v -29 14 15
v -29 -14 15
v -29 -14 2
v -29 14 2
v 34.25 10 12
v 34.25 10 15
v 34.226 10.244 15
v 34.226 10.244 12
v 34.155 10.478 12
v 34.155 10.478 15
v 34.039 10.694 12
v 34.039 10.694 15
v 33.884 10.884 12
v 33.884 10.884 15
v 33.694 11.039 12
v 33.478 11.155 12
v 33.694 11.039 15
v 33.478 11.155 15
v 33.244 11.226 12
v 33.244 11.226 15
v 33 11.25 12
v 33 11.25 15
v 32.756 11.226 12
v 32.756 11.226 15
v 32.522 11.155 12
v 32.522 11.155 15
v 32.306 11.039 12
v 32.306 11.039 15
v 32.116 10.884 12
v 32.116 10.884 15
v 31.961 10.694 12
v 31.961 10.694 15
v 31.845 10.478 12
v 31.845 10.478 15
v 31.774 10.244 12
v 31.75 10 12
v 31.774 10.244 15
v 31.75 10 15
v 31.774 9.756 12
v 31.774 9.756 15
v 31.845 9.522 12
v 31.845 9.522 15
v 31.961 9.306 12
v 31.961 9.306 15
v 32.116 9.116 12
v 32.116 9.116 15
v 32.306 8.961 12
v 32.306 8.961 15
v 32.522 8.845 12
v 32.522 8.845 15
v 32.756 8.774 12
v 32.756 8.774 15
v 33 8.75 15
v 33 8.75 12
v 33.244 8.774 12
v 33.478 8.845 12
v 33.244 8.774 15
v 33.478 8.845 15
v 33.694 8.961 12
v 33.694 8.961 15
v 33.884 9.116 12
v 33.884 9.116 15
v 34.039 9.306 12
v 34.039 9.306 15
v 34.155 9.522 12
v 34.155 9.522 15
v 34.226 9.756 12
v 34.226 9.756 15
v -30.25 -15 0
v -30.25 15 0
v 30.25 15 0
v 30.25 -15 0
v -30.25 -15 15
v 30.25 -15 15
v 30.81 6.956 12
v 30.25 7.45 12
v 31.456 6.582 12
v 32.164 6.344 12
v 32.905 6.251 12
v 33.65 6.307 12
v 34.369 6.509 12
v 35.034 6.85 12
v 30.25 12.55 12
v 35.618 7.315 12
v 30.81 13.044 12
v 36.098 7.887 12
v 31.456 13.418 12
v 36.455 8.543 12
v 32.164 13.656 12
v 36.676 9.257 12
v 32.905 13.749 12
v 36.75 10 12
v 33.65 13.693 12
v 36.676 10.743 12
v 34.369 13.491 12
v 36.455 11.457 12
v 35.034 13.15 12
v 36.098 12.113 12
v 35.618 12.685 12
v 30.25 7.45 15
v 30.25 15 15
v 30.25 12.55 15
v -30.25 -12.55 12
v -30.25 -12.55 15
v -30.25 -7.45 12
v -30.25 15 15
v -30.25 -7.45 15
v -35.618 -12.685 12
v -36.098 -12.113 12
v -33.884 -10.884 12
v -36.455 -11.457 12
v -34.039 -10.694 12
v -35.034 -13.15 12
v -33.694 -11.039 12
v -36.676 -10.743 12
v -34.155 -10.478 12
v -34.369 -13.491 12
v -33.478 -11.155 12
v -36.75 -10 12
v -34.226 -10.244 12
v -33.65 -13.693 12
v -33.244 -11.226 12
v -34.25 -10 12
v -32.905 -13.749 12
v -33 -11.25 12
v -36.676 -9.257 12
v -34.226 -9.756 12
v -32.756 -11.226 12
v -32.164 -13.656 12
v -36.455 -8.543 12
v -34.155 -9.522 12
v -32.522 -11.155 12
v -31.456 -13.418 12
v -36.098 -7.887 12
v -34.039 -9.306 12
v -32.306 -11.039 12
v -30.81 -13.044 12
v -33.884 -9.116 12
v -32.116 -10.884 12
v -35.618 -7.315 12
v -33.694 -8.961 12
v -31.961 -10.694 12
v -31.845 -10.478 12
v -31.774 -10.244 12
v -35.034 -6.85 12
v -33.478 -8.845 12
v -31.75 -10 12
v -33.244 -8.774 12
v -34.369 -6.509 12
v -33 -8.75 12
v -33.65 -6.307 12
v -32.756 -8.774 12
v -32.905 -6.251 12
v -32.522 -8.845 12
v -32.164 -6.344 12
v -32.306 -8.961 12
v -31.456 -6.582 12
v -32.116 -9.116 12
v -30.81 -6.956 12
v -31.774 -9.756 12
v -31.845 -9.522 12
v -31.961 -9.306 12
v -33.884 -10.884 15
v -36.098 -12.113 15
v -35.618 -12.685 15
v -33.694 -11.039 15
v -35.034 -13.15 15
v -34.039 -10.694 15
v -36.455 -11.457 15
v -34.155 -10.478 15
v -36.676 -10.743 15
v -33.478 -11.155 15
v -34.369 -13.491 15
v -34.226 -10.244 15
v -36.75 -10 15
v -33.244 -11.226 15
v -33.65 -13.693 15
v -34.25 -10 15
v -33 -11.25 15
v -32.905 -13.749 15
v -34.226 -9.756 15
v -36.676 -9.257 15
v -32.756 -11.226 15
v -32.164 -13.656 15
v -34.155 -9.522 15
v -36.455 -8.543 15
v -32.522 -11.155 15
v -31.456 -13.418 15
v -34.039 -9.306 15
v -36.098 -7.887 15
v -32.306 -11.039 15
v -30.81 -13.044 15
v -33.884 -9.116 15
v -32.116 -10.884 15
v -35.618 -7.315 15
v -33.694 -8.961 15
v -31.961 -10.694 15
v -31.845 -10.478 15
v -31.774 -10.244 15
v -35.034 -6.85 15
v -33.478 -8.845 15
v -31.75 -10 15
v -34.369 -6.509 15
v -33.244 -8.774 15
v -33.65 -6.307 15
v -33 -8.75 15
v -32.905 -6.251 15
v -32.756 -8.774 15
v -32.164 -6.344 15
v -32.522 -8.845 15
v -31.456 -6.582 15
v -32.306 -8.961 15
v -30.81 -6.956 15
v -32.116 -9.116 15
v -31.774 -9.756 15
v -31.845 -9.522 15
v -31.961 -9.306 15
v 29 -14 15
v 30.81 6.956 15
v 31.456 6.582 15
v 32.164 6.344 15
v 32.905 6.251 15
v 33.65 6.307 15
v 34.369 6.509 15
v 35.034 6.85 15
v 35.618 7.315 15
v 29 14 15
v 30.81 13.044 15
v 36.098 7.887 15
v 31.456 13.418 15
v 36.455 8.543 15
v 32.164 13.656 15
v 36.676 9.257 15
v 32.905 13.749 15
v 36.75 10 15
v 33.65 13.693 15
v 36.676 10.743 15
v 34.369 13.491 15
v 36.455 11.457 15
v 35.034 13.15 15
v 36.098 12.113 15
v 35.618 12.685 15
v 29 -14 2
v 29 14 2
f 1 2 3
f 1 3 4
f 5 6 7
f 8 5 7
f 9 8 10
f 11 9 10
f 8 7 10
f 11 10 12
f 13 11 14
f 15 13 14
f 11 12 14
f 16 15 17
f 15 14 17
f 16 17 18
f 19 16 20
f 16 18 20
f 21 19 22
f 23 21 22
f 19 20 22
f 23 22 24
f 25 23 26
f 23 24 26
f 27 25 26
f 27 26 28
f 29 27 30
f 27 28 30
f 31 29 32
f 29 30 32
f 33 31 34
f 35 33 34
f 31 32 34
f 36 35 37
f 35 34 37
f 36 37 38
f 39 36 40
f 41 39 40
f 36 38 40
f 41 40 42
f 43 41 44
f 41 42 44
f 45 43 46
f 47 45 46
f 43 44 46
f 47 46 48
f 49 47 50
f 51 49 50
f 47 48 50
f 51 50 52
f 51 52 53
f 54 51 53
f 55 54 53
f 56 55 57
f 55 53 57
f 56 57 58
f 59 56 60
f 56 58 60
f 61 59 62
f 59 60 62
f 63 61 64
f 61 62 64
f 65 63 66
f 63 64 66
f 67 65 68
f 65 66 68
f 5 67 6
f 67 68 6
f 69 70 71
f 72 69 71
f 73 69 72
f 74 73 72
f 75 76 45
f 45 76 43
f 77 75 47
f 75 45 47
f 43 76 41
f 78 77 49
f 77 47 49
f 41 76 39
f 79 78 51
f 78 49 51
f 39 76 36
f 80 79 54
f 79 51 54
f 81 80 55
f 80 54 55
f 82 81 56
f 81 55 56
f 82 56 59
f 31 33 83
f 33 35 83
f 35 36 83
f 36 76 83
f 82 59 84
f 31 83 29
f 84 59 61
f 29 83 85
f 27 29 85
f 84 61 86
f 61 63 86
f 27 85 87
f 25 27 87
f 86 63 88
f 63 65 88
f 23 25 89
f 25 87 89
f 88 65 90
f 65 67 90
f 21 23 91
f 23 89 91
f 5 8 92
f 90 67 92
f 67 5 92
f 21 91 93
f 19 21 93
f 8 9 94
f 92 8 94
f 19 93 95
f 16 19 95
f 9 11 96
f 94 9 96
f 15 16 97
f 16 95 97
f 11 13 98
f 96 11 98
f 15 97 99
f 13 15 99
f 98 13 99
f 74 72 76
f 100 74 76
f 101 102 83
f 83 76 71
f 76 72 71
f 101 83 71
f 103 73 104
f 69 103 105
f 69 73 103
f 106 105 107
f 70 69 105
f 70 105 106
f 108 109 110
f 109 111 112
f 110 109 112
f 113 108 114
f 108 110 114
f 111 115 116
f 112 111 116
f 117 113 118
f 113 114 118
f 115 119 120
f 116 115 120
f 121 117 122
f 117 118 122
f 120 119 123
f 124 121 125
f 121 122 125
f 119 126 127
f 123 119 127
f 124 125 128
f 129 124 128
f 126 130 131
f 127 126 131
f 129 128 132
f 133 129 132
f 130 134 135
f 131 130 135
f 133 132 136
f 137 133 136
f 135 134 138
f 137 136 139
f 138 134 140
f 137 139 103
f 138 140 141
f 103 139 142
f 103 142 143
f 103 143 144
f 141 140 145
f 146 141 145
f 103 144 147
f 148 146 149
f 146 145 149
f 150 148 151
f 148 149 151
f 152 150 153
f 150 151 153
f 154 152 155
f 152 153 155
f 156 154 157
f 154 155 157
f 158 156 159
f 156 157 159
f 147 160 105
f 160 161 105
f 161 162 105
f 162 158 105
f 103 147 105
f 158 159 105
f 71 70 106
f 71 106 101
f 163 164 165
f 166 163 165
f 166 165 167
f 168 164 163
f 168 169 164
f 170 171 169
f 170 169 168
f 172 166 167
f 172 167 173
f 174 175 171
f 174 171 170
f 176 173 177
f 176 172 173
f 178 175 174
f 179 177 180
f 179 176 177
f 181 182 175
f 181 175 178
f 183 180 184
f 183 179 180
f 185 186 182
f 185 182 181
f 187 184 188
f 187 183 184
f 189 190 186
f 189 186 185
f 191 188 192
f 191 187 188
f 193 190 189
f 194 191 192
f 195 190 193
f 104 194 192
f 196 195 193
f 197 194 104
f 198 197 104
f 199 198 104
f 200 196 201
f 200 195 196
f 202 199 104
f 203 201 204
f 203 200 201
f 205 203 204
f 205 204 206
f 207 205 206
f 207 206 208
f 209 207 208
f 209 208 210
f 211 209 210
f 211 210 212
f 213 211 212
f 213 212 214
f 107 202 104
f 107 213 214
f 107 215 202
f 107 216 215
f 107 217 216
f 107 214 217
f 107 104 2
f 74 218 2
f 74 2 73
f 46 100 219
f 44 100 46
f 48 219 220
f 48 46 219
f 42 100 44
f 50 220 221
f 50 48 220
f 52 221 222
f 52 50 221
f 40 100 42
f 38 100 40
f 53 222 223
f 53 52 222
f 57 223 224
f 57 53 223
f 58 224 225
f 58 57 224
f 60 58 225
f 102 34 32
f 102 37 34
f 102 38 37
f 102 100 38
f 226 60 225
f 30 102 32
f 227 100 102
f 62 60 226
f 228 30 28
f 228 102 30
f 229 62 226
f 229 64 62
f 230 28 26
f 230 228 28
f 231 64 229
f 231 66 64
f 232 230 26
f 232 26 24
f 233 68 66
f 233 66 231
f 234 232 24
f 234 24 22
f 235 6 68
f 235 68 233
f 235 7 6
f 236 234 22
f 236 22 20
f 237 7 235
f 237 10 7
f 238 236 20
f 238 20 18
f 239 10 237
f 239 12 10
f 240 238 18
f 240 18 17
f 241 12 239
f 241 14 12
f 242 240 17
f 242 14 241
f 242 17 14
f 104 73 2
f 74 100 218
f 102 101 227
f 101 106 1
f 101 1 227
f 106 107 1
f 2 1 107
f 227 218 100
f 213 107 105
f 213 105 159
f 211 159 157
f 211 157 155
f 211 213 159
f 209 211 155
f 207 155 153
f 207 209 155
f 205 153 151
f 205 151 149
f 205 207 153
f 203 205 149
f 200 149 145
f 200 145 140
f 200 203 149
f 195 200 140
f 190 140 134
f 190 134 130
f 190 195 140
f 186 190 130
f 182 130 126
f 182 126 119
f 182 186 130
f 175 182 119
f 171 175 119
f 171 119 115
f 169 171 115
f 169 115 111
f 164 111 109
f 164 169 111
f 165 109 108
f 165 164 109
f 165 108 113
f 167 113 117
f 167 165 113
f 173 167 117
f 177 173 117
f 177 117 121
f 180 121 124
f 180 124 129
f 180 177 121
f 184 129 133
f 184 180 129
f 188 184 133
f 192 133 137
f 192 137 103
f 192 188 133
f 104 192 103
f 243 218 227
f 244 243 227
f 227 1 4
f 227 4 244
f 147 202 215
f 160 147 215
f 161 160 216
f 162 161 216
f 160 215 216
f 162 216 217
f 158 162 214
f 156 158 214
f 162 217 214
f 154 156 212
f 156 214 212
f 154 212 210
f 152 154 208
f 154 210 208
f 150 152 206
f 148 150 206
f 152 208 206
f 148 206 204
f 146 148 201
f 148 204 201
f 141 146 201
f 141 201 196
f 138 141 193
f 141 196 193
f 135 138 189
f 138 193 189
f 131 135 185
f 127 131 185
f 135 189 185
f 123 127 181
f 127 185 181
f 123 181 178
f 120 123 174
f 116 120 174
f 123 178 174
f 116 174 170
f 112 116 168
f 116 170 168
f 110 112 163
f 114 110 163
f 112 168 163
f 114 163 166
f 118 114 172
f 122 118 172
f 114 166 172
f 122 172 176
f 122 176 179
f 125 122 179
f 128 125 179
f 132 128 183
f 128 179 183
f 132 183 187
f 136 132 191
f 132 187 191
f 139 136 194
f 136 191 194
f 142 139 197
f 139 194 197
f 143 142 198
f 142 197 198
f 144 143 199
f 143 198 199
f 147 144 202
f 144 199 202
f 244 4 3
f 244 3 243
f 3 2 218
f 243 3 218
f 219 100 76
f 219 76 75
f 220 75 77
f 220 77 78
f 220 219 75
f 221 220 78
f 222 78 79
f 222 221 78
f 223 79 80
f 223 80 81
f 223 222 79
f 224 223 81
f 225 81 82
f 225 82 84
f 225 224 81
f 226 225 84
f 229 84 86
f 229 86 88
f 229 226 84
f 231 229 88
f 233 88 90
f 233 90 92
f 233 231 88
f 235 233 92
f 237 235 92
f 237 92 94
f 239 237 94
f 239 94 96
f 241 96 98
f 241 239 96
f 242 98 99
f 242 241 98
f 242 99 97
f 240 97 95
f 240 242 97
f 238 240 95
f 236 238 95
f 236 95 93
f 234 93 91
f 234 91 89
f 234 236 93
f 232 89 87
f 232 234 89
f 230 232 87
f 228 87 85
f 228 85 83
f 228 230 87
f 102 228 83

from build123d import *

# Parameters (mm, degrees)
SKIZZE1_W                       = 60.5
SKIZZE1_H                       = 30
AUFSATZ_LINEAR_AUSTRAGEN1_DEPTH = 15
SKIZZE2_W                       = 58
SKIZZE2_H                       = 28
SKIZZE2_R                       = 1.25
SCHNITT_LINEAR_AUSTRAGEN2_DEPTH = 13
SKIZZE2_5_R                     = 1.25
AUFSATZ_LINEAR_AUSTRAGEN2_DEPTH = 3


with BuildPart() as part:
    # Skizze1 → Aufsatz-Linear austragen1 (new body)
    with BuildSketch(Plane.XY):
        Rectangle(SKIZZE1_W, SKIZZE1_H)
    extrude(amount=AUFSATZ_LINEAR_AUSTRAGEN1_DEPTH)

    # Skizze2 → Schnitt-Linear austragen2 (cut)
    # profile 1 of 3: a face of its own
    with BuildSketch(Plane.XY.offset(15)):
        Rectangle(SKIZZE2_W, SKIZZE2_H)
    # profile 2 of 3: a face of its own
    with BuildSketch(Plane.XY.offset(15)):
        with BuildLine():
            Line((-30.25, -7.450490243), (-30.25, -12.549509757))
            ThreePointArc((-30.25, -12.549509757), (-36.75, -10), (-30.25, -7.450490243))
        make_face()
        with Locations((-33, -10)):
            Circle(SKIZZE2_R, mode=Mode.SUBTRACT)
    # profile 3 of 3: a face of its own
    with BuildSketch(Plane.XY.offset(15)):
        with BuildLine():
            Line((30.25, 12.549509757), (30.25, 7.450490243))
            ThreePointArc((30.25, 7.450490243), (36.75, 10), (30.25, 12.549509757))
        make_face()
        with Locations((33, 10)):
            Circle(SKIZZE2_R, mode=Mode.SUBTRACT)
    extrude(amount=-SCHNITT_LINEAR_AUSTRAGEN2_DEPTH, mode=Mode.SUBTRACT)

    # Skizze2<5> → Aufsatz-Linear austragen2 (add)
    # profile 1 of 2: a face of its own
    with BuildSketch(Plane.XY.offset(15)):
        with BuildLine():
            Line((-30.25, -12.549509757), (-30.25, -7.450490243))
            ThreePointArc((-30.25, -7.450490243), (-36.75, -10), (-30.25, -12.549509757))
        make_face()
        with Locations((-33, -10)):
            Circle(SKIZZE2_5_R, mode=Mode.SUBTRACT)
    # profile 2 of 2: a face of its own
    with BuildSketch(Plane.XY.offset(15)):
        with BuildLine():
            ThreePointArc((30.25, 7.450490243), (36.75, 10), (30.25, 12.549509757))
            Line((30.25, 12.549509757), (30.25, 7.450490243))
        make_face()
        with Locations((33, 10)):
            Circle(SKIZZE2_5_R, mode=Mode.SUBTRACT)
    extrude(amount=-AUFSATZ_LINEAR_AUSTRAGEN2_DEPTH)


solid = part.part
